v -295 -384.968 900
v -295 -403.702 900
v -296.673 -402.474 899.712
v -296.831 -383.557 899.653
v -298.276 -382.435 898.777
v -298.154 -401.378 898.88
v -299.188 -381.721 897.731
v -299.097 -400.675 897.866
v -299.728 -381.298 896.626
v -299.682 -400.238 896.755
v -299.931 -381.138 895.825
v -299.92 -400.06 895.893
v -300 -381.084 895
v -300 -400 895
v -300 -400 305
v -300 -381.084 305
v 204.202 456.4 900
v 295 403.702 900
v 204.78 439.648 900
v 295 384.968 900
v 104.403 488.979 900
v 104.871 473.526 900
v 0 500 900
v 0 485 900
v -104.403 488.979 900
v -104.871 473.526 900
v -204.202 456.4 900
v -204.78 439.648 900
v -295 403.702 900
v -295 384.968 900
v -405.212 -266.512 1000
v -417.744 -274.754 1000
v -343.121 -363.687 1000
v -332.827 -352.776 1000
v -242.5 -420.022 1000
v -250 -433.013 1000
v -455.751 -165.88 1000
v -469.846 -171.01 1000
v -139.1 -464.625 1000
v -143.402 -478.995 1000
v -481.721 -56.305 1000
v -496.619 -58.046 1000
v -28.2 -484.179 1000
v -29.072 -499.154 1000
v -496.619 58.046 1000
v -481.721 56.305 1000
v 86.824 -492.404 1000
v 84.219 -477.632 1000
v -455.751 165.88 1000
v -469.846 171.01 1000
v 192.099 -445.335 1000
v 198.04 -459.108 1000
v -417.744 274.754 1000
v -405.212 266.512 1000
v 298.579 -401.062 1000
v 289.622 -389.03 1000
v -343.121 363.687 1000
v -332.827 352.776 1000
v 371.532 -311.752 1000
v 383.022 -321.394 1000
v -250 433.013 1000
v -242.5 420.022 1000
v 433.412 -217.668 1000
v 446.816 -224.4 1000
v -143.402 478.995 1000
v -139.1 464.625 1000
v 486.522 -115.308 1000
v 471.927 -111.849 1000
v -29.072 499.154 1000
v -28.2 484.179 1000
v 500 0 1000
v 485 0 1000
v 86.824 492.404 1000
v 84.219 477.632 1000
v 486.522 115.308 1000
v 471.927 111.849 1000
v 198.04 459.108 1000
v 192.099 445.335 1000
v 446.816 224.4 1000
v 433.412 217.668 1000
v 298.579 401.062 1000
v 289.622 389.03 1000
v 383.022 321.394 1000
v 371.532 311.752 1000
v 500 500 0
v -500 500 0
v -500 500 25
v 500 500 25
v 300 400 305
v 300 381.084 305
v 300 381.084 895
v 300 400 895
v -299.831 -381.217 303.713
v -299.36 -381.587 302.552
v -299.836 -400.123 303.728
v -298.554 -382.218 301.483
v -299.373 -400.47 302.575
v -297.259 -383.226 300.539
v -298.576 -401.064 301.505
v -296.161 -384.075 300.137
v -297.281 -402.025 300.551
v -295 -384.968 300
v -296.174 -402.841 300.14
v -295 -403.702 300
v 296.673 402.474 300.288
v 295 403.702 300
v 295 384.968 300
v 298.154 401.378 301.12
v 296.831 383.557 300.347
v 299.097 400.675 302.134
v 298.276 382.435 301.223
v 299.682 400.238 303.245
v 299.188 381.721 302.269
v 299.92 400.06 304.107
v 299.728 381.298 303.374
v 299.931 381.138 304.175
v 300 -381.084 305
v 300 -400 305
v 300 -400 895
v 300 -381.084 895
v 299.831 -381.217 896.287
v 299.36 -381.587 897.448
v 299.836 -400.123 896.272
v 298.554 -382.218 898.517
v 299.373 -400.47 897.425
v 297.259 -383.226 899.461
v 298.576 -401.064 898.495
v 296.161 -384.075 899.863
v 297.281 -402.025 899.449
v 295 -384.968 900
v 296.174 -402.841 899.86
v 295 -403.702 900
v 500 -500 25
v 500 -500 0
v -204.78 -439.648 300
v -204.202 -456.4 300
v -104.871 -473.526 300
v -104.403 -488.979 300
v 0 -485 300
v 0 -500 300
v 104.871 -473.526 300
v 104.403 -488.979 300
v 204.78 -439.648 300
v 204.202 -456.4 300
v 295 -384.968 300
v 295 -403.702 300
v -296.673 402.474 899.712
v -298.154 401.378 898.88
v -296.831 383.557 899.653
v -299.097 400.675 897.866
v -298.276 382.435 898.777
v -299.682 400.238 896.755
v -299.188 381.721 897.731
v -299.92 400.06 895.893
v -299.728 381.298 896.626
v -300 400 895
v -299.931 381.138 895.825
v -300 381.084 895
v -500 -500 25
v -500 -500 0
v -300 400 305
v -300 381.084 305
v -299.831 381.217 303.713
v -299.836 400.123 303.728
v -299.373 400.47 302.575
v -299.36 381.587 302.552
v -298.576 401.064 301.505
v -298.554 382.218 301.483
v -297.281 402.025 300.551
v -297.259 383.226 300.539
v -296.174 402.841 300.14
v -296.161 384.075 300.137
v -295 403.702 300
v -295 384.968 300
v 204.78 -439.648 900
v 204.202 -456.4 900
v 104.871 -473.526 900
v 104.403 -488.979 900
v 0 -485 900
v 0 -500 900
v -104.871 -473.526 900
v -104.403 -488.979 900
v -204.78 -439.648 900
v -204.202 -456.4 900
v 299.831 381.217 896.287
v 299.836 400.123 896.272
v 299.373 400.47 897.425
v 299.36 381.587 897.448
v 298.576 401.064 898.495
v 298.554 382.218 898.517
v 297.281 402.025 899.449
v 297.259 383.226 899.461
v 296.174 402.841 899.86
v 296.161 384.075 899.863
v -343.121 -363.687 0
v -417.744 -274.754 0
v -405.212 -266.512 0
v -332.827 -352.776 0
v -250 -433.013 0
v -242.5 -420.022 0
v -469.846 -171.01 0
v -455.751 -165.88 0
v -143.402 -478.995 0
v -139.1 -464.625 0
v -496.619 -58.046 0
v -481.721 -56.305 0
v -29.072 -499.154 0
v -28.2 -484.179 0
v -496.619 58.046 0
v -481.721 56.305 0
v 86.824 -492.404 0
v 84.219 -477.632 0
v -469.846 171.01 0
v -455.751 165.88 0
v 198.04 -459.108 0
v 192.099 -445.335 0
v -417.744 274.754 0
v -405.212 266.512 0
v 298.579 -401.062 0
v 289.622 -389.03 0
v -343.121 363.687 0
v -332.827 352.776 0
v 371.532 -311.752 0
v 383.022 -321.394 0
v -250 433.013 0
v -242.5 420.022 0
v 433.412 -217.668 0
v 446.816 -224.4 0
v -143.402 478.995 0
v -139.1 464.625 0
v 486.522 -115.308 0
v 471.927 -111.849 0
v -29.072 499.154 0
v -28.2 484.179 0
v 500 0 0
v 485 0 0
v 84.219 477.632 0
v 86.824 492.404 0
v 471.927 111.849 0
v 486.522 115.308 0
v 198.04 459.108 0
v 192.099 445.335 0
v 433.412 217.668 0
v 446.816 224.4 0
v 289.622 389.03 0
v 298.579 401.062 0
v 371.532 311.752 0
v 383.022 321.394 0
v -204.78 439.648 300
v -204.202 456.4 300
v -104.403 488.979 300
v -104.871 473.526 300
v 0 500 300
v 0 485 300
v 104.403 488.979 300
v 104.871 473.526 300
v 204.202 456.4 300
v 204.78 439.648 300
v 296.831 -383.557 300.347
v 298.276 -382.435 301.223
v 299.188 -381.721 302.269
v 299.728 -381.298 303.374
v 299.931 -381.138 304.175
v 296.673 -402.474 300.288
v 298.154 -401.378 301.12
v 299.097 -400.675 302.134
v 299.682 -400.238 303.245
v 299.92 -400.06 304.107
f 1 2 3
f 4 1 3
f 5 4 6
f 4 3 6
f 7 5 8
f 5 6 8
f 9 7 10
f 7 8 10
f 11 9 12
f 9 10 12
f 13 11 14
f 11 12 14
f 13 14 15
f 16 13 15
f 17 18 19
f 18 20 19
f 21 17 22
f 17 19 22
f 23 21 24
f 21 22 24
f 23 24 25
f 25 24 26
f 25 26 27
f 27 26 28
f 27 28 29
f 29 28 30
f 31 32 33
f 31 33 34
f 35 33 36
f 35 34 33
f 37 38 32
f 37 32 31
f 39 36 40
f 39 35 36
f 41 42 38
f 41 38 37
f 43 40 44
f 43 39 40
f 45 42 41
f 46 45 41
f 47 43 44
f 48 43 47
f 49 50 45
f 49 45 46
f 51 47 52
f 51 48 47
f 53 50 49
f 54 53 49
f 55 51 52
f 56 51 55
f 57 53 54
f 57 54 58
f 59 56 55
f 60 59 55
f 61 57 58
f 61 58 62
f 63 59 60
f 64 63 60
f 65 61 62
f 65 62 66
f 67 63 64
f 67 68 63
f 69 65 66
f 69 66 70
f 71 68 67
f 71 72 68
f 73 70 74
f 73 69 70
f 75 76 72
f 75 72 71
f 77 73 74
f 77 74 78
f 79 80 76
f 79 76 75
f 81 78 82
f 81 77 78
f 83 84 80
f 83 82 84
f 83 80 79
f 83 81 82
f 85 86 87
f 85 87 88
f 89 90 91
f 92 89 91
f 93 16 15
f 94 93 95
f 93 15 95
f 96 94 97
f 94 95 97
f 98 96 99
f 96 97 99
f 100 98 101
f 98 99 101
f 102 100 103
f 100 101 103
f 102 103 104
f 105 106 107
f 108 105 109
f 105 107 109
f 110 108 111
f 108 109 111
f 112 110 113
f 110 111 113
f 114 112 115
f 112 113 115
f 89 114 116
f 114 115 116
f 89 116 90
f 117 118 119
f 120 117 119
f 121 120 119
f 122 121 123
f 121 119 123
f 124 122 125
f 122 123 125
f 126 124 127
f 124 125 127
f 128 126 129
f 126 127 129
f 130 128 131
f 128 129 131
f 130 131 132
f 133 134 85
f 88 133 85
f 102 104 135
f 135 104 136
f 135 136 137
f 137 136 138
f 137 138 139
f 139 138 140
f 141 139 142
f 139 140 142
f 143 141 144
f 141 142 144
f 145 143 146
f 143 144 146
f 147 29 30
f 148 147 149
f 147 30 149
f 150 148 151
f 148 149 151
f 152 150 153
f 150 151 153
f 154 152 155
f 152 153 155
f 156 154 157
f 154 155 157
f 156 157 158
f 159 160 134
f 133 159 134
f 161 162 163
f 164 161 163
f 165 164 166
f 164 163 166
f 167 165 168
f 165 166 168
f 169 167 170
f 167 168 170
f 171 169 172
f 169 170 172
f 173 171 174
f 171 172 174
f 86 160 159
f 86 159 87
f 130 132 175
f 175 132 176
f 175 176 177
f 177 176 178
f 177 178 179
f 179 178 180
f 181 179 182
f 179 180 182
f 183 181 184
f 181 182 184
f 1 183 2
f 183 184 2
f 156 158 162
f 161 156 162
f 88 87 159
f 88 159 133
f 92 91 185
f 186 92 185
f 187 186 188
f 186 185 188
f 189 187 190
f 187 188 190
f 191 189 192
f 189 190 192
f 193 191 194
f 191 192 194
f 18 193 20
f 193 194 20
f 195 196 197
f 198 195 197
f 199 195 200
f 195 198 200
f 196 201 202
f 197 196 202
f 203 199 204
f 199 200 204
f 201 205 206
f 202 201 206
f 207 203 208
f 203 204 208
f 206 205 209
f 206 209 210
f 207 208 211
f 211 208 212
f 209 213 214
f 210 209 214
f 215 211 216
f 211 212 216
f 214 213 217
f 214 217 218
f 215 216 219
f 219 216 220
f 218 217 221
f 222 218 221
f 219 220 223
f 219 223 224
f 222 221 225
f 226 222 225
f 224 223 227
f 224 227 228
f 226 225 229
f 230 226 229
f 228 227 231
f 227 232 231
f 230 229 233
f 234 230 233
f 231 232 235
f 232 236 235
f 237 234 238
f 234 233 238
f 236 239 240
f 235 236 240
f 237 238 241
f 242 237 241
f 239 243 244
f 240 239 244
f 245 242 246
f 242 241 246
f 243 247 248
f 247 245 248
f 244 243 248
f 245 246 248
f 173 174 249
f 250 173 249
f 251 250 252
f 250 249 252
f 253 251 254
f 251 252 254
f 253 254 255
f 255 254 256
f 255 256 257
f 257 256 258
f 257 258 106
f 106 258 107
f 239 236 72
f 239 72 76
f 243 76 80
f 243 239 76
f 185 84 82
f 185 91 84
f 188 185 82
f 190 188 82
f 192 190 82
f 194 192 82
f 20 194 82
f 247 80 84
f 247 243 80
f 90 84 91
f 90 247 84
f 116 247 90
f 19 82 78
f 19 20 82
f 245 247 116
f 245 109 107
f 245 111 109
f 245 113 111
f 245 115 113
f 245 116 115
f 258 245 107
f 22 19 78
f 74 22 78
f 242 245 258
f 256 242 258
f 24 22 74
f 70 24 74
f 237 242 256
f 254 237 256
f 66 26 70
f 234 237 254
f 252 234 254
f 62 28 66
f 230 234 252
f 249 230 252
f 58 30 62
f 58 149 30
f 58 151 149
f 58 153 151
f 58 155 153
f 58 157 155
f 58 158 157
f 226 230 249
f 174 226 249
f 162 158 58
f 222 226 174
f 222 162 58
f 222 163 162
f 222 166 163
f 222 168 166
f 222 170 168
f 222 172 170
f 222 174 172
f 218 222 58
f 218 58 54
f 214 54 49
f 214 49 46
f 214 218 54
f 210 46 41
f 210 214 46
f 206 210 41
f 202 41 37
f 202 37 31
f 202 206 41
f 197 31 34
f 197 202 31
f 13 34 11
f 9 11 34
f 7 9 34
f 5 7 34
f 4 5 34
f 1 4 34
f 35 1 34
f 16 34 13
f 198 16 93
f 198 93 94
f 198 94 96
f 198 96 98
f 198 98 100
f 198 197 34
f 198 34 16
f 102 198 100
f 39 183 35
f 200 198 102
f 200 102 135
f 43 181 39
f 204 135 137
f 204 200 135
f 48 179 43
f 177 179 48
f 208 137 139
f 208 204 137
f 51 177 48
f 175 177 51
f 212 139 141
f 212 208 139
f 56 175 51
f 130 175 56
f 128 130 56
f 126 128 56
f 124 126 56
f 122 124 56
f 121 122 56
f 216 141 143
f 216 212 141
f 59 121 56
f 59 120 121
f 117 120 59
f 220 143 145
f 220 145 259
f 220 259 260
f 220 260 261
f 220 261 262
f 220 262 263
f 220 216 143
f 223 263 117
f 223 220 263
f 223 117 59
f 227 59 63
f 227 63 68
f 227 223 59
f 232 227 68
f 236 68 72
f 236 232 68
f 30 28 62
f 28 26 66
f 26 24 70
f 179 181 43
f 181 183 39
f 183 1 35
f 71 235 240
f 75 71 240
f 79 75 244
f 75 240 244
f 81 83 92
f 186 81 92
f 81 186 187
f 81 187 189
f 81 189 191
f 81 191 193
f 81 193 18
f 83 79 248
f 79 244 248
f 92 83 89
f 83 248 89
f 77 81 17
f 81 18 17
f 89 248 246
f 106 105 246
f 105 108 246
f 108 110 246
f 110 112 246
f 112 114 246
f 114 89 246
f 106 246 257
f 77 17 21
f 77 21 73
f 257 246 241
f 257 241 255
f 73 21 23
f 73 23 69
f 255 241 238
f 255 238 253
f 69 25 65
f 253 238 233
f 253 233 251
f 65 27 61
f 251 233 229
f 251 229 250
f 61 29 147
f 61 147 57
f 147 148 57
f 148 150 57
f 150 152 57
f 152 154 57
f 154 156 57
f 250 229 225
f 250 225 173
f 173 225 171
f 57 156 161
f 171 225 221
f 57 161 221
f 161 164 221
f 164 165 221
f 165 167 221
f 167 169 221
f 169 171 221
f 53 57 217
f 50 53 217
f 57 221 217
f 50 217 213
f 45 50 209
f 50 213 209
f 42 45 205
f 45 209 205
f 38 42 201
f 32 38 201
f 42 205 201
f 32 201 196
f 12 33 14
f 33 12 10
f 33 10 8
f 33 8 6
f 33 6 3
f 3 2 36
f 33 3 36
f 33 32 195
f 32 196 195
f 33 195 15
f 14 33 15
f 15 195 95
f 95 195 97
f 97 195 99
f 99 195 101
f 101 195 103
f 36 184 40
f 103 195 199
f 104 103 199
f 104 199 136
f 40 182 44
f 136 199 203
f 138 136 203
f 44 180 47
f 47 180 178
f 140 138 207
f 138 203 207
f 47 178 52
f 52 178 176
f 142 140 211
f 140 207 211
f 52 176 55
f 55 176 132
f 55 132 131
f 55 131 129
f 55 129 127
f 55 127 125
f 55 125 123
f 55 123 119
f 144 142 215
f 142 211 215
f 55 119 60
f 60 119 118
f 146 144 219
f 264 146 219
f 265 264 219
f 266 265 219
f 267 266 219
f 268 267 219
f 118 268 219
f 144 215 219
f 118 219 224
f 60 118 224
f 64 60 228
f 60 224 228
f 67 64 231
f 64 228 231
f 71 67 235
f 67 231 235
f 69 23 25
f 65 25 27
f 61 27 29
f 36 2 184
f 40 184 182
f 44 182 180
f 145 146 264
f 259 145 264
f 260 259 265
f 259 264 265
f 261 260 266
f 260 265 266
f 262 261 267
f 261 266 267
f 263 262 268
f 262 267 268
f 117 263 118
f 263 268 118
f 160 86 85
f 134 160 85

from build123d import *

# Parameters (mm, degrees)
F0_R     = 500
F0_R_2   = 485
F2_DEPTH = 1000
F5_DEPTH = 500
F3_W     = 1000
F3_H     = 1000
F6_DEPTH = 25


with BuildPart() as f2:
    # F0 (on Top) → F2 (new body)
    with BuildSketch(Plane.XY):
        Circle(F0_R)
        Circle(F0_R_2, mode=Mode.SUBTRACT)
    extrude(amount=F2_DEPTH)

    # F4 (on Front) → F5 (cut, symmetric)
    with BuildSketch(Plane.XZ):
        with BuildLine():
            Line((295, 900), (-295, 900))
            ThreePointArc((-295, 900), (-298.535534, 898.535534), (-300, 895))
            Line((-300, 895), (-300, 305))
            ThreePointArc((-300, 305), (-298.535534, 301.464466), (-295, 300))
            Line((-295, 300), (295, 300))
            ThreePointArc((295, 300), (298.535534, 301.464466), (300, 305))
            Line((300, 305), (300, 895))
            ThreePointArc((300, 895), (298.535534, 898.535534), (295, 900))
        make_face()
    extrude(amount=F5_DEPTH, both=True, mode=Mode.SUBTRACT)


with BuildPart() as f6:
    # F3 (on face) → F6 (new body)
    with BuildSketch(Plane.XY):
        Rectangle(F3_W, F3_H)
    extrude(amount=F6_DEPTH)


solid = Compound([f2.part, f6.part])
